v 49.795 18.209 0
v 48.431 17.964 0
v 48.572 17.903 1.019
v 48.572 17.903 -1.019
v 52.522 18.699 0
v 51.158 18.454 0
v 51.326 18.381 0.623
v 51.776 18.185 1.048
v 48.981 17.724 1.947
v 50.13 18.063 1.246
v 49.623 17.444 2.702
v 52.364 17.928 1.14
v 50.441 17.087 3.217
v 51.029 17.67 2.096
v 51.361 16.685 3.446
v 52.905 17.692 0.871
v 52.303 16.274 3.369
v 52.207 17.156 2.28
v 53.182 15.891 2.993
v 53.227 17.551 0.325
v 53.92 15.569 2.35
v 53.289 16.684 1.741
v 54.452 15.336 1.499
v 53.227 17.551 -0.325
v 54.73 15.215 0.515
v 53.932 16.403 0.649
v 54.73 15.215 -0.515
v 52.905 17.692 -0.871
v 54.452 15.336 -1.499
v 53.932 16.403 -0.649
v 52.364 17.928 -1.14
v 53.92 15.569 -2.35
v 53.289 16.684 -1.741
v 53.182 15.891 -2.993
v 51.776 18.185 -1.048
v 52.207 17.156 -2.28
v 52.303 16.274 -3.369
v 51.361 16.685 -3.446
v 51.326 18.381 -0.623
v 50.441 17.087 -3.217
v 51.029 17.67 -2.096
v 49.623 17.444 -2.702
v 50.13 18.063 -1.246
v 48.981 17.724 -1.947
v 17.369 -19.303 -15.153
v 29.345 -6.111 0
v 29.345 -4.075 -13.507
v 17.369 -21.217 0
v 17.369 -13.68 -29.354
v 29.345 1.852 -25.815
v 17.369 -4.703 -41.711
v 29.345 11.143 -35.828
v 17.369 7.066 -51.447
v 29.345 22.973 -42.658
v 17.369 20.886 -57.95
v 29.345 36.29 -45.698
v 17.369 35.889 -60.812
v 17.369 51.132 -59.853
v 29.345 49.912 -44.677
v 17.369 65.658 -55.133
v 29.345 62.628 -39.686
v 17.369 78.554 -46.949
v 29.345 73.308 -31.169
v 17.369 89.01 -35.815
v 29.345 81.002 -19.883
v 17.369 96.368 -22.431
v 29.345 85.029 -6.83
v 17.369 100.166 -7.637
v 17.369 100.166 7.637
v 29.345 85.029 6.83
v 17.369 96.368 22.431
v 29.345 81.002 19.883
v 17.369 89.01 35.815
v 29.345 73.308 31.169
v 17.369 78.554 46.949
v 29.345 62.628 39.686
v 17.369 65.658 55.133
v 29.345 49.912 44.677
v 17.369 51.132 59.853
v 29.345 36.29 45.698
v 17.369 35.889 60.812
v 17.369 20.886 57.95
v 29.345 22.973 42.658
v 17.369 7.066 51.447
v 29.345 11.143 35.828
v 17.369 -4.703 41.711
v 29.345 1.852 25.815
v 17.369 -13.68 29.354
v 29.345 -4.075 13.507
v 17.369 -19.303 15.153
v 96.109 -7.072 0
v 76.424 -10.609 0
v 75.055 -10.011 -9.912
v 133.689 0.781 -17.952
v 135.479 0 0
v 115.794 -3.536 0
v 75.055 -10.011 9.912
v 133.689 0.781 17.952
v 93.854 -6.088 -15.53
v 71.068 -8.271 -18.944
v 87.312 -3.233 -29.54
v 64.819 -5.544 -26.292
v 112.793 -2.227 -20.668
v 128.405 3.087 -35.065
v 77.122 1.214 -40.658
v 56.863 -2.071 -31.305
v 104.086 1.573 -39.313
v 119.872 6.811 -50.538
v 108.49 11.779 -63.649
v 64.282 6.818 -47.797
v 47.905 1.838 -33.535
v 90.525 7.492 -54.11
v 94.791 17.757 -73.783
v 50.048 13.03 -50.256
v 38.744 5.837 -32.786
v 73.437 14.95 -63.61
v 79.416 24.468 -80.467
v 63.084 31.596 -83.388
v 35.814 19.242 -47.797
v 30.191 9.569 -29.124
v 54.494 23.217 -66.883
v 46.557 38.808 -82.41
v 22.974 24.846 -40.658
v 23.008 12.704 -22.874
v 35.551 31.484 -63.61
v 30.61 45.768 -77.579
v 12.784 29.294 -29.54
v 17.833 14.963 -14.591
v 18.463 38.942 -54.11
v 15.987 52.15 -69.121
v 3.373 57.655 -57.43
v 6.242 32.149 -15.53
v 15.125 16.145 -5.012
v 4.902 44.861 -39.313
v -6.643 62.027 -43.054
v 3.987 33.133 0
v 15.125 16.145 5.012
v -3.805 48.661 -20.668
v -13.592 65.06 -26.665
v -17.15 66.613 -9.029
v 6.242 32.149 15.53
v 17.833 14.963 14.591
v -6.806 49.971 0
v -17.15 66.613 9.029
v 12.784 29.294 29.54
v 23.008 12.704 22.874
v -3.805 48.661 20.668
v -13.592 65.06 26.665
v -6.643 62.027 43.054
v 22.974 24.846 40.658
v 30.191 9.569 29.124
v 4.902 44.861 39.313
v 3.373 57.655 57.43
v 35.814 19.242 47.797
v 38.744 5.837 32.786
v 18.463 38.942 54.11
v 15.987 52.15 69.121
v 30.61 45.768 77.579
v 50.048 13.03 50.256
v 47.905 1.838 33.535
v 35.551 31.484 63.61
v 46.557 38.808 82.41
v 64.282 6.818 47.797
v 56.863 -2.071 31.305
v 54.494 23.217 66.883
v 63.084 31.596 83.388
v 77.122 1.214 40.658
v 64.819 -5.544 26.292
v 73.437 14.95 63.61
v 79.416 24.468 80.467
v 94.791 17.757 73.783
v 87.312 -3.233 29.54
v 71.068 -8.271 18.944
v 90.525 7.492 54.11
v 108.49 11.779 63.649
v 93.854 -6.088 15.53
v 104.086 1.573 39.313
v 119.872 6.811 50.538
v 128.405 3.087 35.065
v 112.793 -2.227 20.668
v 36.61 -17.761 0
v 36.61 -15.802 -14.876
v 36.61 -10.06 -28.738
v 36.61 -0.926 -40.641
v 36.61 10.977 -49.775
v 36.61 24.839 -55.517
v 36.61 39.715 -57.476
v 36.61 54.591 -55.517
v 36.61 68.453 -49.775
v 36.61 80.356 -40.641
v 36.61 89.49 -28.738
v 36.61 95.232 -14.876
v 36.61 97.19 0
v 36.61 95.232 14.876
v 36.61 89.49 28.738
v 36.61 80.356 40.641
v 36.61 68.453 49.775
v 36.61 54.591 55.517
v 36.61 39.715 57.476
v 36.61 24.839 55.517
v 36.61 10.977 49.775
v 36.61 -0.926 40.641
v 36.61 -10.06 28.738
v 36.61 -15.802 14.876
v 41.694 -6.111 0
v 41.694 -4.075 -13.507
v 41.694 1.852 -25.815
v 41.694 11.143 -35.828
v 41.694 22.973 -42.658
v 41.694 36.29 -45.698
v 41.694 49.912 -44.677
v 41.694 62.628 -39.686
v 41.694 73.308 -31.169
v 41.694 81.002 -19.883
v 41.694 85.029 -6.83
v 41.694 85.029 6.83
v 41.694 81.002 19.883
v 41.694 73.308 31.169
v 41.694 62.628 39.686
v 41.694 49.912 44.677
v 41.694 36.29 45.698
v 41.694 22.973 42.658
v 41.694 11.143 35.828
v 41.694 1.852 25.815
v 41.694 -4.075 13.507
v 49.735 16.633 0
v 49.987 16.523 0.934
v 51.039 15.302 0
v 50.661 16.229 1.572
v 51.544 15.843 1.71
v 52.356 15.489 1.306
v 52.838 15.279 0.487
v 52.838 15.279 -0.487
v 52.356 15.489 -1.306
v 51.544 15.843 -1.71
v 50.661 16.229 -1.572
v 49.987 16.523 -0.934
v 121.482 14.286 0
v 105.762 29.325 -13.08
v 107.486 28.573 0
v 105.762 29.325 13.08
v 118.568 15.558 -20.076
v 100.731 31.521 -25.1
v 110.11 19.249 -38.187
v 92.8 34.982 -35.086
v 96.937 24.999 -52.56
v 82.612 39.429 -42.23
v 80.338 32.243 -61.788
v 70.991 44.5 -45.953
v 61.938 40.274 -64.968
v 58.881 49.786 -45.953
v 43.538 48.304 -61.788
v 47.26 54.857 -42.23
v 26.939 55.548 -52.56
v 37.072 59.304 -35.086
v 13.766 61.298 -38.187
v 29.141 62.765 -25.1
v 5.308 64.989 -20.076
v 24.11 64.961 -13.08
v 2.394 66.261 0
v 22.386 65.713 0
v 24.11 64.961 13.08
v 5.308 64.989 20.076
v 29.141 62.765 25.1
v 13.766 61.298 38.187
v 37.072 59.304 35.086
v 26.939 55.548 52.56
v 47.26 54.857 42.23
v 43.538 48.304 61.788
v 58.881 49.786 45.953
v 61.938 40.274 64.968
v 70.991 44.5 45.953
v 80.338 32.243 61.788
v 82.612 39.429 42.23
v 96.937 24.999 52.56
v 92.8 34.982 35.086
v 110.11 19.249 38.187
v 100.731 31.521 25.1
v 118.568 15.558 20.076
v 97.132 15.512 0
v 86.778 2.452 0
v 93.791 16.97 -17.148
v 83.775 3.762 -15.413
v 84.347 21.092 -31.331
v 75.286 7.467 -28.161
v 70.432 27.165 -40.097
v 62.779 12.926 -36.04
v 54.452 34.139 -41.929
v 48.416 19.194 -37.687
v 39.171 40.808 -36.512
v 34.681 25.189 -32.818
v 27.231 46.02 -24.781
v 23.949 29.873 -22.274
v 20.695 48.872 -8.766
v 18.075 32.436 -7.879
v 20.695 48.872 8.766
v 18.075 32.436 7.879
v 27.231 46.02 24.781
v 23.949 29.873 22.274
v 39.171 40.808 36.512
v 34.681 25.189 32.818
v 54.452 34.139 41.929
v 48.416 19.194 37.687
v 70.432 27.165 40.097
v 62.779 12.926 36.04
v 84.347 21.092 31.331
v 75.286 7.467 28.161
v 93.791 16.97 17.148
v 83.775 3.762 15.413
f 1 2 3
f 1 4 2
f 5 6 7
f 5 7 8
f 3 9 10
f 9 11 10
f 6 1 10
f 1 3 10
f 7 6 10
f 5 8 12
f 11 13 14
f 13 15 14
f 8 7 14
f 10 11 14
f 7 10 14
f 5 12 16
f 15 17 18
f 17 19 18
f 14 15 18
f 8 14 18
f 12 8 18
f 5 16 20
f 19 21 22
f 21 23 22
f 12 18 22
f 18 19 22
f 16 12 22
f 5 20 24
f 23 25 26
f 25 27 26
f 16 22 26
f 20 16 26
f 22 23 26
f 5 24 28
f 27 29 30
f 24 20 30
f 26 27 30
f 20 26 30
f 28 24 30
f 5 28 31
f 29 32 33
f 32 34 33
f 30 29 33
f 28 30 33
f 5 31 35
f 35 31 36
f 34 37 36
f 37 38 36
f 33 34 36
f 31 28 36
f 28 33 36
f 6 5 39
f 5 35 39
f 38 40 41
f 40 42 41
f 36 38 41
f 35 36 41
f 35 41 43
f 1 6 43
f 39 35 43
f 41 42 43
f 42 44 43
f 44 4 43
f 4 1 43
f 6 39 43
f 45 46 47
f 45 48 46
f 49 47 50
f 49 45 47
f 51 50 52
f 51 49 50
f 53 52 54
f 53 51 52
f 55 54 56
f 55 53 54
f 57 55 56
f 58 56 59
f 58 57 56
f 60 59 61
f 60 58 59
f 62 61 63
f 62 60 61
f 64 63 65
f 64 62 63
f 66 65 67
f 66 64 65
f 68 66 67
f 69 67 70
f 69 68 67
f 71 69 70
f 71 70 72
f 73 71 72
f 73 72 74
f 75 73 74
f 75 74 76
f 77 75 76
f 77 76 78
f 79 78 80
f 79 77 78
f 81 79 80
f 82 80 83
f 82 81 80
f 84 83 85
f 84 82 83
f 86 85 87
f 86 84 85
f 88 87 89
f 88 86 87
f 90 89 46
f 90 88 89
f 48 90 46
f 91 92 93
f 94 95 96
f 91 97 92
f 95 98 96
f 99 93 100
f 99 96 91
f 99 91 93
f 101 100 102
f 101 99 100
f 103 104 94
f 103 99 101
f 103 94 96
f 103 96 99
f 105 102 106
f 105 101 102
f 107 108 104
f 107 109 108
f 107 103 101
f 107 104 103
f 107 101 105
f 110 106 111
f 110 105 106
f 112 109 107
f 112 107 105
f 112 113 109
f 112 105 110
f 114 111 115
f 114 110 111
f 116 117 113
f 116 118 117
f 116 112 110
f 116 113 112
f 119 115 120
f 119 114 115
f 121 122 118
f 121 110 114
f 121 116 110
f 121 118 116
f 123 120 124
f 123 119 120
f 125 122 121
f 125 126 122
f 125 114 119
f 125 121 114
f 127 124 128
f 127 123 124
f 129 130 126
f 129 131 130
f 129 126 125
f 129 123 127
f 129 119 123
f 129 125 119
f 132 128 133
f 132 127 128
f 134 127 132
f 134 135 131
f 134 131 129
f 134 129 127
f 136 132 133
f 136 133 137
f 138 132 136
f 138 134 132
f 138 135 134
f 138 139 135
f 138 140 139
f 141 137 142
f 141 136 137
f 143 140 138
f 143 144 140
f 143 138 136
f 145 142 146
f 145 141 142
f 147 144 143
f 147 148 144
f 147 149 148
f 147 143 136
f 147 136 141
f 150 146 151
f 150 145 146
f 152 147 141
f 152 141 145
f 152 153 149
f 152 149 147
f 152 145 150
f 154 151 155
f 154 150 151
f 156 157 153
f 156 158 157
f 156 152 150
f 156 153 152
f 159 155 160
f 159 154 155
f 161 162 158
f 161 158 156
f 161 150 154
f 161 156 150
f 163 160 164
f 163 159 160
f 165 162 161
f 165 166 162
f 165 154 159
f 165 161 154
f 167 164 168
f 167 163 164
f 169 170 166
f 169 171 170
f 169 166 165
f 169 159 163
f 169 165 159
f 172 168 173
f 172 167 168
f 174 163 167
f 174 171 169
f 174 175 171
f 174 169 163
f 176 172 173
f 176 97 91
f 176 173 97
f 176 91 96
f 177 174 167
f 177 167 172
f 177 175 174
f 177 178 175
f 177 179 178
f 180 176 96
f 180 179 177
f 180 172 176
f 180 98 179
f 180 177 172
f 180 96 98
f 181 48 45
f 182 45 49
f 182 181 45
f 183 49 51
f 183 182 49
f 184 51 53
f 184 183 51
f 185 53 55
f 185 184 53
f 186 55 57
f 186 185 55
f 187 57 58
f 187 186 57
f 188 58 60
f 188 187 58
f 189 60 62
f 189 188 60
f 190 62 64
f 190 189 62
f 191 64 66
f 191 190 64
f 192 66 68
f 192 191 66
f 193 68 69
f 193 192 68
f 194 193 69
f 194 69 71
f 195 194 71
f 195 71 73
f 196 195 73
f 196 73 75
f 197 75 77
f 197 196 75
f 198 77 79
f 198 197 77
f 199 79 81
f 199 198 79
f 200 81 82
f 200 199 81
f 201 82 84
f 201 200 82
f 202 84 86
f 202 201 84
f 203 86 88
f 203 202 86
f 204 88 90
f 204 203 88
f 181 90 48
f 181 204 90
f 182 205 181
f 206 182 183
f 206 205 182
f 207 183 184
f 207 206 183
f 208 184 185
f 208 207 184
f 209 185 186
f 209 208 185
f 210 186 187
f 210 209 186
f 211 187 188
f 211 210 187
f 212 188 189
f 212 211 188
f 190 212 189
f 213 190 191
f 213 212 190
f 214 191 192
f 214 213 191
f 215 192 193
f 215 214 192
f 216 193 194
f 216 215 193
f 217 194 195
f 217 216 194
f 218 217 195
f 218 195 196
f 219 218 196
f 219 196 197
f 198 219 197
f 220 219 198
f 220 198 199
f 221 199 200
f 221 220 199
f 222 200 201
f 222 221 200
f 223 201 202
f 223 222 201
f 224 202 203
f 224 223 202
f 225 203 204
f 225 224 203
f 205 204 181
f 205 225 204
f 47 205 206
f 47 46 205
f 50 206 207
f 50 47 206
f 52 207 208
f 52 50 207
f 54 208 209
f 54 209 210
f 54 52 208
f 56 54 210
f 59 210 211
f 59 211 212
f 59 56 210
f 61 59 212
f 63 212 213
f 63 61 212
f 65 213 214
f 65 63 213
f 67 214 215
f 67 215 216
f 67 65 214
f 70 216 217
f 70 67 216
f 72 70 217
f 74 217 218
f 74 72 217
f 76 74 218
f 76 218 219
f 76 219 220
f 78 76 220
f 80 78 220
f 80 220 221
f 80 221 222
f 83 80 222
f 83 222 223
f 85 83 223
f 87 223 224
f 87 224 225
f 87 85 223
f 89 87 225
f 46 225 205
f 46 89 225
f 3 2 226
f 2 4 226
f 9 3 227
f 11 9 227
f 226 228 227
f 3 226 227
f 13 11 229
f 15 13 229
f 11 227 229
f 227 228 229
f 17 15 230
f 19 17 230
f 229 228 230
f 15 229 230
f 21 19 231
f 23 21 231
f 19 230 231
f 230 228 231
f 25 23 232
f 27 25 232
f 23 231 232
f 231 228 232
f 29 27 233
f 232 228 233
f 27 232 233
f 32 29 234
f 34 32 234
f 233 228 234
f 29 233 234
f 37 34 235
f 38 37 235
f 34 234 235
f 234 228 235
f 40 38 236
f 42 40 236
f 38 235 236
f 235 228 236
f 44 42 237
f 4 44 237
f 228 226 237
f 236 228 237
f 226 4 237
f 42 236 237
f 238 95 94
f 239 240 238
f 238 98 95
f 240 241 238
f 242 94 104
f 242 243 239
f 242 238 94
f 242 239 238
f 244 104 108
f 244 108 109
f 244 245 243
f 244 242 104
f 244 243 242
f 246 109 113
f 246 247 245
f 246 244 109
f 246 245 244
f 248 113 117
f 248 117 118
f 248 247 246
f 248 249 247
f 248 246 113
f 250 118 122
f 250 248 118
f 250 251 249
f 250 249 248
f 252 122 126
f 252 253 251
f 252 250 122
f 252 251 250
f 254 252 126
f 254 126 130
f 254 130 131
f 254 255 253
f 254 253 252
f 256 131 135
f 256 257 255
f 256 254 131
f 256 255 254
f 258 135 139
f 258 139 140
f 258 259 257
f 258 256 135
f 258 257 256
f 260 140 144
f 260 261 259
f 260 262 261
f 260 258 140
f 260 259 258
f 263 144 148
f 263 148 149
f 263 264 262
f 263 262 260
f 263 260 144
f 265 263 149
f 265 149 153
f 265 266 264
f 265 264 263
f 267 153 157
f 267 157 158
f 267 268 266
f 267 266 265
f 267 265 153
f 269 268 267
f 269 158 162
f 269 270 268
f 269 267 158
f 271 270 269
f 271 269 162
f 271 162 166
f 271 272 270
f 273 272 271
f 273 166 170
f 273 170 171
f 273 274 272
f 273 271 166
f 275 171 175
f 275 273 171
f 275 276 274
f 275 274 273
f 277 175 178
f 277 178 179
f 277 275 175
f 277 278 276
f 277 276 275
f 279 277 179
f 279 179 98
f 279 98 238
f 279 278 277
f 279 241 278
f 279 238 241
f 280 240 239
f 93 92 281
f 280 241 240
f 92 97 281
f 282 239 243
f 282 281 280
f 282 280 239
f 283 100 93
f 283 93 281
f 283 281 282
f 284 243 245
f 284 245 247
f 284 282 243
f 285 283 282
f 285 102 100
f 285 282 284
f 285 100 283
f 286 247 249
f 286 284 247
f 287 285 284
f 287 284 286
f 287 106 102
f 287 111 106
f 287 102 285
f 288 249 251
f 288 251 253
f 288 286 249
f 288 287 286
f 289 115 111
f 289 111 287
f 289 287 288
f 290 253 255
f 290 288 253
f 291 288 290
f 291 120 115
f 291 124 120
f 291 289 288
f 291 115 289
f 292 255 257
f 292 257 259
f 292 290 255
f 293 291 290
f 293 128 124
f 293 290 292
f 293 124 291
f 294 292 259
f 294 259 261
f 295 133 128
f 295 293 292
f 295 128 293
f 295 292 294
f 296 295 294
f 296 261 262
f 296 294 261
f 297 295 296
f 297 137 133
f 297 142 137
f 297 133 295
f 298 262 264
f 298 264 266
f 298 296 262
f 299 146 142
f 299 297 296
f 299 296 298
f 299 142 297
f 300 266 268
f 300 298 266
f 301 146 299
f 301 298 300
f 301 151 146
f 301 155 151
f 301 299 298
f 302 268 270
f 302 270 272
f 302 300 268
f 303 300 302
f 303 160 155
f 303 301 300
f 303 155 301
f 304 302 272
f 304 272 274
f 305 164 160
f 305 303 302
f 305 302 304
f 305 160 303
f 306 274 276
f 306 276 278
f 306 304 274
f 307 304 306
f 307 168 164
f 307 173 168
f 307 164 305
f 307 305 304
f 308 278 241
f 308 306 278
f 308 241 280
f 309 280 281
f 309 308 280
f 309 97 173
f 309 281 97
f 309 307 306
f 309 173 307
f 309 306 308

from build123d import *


# Not quite as in the source:
# - a feature of the source that left no trace in its solid (it failed there, or was rolled back) is left out


with BuildPart() as f2:
    # F0 (on Top) → F2 (revolve)
    with BuildSketch(Plane.XY):
        Polygon((41.6941601038, -6.1108729366), (29.3448964108, -6.1108729366), (17.3691271637, -21.2170399226), (36.609770419, -17.7606732331), align=None)
    revolve(axis=Axis((21.6941601038, 39.7148840129, 0), (1, 0, 0)))


with BuildPart() as f3:
    # F0 (on Top) → F3 (revolve)
    with BuildSketch(Plane.XY):
        Polygon((52.5221076777, 18.6990717526), (48.4309267247, 17.964136783), (51.0393636355, 15.3016783478), align=None)
    revolve(axis=Axis((41.6941601038, -6.1108729366, 0), (0.4, 0.916515139, 0)))


with BuildPart() as f3b:
    # F0 (on Top) → F3, piece 2 (revolve)
    with BuildSketch(Plane.XY):
        Polygon((107.4856412209, 28.5726567443), (76.4238416599, -10.6085199613), (135.4785561562, 0), align=None)
    revolve(axis=Axis((41.6941601038, -6.1108729366, 0), (0.4, 0.916515139, 0)))


solid = Compound([f2.part, f3.part, f3b.part])
